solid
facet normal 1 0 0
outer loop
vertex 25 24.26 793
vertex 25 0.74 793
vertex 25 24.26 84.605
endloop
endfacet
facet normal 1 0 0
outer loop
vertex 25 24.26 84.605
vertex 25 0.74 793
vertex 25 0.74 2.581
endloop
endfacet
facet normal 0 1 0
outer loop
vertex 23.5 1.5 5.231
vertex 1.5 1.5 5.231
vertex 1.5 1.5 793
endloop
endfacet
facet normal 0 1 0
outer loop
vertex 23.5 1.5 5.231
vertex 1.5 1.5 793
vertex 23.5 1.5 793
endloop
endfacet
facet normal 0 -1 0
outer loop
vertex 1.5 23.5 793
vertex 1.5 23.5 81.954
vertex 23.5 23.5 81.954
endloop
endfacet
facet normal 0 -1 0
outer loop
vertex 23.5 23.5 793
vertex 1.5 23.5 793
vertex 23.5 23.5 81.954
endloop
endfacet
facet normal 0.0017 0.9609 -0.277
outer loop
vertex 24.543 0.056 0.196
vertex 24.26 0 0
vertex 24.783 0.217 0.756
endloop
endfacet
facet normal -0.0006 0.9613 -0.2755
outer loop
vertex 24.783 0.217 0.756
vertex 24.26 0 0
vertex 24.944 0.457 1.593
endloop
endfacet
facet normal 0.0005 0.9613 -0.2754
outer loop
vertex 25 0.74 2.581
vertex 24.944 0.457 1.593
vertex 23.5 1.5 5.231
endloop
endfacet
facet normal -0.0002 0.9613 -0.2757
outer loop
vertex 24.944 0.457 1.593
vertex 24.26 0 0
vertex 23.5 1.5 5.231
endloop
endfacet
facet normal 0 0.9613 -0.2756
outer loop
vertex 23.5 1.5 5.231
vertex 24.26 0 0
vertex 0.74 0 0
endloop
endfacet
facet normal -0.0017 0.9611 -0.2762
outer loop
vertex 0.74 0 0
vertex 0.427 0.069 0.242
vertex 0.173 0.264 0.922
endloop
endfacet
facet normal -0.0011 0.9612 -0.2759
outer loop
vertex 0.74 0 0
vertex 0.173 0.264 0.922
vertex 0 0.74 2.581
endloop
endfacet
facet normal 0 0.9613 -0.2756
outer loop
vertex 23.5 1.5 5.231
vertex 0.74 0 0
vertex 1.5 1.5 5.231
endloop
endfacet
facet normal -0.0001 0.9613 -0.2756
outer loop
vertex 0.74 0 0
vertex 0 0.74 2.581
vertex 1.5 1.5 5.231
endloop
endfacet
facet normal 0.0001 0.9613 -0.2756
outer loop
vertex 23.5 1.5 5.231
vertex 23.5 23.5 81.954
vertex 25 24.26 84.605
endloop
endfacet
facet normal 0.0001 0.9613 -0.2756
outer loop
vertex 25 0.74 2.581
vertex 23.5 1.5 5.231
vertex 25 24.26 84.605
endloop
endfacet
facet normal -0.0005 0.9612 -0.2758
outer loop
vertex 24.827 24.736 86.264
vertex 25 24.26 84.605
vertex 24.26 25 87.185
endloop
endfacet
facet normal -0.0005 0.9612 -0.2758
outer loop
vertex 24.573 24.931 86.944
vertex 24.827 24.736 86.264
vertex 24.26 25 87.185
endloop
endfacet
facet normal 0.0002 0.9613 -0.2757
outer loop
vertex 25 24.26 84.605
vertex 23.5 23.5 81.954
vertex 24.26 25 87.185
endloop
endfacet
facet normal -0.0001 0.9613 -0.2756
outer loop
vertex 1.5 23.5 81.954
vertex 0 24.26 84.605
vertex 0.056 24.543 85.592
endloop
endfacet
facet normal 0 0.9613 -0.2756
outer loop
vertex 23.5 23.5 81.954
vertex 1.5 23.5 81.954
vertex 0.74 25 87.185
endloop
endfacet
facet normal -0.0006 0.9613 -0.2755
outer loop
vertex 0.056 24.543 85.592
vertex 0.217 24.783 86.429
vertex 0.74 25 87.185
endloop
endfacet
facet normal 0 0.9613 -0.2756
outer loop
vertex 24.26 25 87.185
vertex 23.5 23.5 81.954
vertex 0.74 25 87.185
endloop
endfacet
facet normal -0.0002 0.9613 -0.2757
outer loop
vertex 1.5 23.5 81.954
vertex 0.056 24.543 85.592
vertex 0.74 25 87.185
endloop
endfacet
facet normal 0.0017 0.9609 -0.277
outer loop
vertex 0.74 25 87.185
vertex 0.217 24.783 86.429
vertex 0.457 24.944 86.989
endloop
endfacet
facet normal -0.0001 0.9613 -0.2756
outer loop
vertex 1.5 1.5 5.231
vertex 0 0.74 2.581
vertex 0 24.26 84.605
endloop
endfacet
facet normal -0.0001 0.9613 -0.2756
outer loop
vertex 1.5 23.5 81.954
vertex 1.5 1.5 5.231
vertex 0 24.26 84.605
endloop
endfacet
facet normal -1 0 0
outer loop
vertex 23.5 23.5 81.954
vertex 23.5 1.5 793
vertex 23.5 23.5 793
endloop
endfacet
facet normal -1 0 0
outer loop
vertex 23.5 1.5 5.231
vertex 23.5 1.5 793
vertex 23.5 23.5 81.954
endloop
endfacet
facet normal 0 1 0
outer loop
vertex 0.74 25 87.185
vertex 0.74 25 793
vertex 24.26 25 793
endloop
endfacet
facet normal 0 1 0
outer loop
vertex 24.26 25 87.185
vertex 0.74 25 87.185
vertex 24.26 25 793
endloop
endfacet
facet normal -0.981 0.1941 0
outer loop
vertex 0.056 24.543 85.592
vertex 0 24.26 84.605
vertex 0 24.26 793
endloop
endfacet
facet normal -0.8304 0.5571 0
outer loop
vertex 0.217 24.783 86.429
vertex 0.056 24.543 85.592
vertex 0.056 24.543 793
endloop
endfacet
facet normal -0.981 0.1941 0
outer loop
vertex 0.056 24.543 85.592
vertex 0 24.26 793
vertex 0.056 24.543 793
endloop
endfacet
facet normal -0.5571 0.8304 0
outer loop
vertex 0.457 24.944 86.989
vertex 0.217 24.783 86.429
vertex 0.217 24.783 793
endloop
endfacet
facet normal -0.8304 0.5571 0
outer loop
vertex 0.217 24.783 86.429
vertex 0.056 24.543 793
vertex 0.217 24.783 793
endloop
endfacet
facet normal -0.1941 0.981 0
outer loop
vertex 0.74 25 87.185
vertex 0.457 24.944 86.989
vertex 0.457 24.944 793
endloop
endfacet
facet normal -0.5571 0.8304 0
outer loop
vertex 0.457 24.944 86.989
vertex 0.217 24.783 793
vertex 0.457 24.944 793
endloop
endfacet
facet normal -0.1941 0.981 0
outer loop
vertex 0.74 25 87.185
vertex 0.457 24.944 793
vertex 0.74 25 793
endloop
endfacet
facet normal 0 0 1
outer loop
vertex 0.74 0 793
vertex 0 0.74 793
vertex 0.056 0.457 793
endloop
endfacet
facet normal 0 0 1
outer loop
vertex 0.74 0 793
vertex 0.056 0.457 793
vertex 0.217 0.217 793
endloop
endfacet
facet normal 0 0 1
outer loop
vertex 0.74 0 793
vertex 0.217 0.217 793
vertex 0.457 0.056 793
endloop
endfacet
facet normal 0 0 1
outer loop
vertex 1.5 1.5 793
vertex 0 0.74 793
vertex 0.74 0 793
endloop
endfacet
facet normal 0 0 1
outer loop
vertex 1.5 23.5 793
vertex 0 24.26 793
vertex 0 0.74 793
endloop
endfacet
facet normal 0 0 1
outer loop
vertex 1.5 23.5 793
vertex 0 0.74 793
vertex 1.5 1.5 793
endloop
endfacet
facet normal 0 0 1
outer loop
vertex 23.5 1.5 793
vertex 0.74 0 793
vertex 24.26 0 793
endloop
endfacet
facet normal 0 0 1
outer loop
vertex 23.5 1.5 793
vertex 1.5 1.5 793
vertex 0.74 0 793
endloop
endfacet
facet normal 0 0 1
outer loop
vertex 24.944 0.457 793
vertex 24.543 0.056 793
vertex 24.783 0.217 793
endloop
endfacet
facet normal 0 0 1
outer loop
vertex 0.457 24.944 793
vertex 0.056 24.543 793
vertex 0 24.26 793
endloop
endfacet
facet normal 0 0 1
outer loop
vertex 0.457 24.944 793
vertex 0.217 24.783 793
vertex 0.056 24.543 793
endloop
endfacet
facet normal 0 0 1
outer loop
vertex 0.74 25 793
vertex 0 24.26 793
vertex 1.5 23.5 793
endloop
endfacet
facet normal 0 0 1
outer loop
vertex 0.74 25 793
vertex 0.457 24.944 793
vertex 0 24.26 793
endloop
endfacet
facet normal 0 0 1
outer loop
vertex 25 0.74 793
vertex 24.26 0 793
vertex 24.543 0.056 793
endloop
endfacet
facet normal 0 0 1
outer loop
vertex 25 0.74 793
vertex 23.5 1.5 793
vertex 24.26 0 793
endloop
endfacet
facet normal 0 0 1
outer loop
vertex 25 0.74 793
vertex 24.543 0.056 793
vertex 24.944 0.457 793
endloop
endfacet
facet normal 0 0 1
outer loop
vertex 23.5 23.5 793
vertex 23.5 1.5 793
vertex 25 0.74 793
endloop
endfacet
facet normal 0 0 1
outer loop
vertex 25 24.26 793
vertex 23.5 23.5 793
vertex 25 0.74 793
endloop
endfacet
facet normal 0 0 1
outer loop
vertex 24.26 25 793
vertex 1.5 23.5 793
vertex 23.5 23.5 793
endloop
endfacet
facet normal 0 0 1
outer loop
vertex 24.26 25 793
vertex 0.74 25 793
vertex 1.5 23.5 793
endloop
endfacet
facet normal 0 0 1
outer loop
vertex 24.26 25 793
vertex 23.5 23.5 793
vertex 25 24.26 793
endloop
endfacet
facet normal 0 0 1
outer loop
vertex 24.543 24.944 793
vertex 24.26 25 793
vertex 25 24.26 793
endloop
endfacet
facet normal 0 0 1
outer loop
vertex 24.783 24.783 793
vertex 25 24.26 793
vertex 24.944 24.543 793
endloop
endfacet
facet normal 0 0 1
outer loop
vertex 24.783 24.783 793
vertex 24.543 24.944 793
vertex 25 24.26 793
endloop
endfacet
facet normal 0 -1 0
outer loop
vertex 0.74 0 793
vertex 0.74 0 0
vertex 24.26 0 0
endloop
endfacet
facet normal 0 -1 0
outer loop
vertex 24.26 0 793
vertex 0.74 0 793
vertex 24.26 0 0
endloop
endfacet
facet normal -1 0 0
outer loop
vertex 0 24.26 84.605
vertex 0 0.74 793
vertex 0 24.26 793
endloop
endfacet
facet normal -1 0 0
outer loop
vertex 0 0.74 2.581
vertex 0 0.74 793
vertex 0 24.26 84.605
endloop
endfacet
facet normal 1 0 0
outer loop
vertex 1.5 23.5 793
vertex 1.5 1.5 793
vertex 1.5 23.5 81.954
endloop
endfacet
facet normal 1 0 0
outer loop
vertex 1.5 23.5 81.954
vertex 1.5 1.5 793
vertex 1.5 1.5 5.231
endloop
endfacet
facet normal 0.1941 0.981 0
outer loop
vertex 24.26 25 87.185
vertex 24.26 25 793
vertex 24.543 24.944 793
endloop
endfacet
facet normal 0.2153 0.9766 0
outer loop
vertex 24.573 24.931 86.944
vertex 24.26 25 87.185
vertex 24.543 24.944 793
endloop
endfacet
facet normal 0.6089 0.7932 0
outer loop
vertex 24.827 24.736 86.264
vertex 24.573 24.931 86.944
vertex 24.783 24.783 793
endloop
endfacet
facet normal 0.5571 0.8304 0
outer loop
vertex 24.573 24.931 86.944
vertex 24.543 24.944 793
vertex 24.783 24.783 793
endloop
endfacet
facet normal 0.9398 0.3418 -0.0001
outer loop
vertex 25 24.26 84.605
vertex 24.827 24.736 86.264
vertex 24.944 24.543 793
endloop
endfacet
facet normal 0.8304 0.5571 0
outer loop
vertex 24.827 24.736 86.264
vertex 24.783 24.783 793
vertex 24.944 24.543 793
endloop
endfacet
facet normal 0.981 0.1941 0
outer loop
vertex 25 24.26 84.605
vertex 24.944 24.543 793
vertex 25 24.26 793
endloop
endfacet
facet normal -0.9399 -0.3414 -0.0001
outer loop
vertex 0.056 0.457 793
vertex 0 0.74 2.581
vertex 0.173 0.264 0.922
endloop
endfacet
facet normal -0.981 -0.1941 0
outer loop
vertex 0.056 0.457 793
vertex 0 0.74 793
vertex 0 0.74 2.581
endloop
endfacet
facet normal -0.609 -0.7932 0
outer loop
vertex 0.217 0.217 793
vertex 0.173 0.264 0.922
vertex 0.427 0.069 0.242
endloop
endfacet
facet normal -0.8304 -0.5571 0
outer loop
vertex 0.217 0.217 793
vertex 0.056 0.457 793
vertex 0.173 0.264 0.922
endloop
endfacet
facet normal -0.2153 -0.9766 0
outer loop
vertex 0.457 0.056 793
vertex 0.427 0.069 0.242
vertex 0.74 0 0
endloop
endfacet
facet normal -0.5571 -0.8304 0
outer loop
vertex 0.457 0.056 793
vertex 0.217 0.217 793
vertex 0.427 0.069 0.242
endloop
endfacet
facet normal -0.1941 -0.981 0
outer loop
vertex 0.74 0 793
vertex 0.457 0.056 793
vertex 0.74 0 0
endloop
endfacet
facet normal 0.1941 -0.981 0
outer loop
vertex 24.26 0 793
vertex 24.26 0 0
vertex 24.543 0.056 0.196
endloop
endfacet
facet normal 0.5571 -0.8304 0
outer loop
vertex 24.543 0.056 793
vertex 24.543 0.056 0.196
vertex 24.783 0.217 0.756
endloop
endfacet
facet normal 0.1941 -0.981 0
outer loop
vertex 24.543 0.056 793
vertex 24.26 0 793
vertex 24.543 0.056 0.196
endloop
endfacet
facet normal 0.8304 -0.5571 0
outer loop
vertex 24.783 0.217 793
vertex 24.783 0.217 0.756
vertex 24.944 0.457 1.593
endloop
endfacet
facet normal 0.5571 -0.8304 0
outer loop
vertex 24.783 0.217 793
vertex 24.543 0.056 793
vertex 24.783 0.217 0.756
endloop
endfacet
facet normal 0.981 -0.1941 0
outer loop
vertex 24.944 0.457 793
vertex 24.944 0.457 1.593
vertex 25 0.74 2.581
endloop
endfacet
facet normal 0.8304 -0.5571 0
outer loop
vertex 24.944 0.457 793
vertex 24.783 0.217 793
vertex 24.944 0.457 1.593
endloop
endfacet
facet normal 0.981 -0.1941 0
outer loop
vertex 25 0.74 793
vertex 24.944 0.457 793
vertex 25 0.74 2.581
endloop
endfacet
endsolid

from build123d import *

# Parameters (mm, degrees)
SKETCH_W     = 25
SKETCH_H     = 25
SKETCH_W_2   = 22
SKETCH_H_2   = 22
PAD_DEPTH    = 793
FILLET_R     = 0.74
POCKET_DEPTH = 25.001


with BuildPart() as part:
    # Sketch → Pad (new body)
    with BuildSketch(Plane.XY):
        with Locations((12.5, 12.5)):
            Rectangle(SKETCH_W, SKETCH_H)
        with Locations((12.5, 12.5)):
            Rectangle(SKETCH_W_2, SKETCH_H_2, mode=Mode.SUBTRACT)
    extrude(amount=PAD_DEPTH)

    # Fillet
    fillet_edges = [part.edges().sort_by_distance(p)[0] for p in [
        (25, 0, 396.5),
        (0, 0, 396.5),
        (25, 25, 396.5),
        (0, 25, 396.5),
    ]]
    fillet(fillet_edges, radius=FILLET_R)

    # Sketch001 (on Face6 of Fillet) → Pocket (cut, through all)
    with BuildSketch(Plane(origin=(0, 0, 0), x_dir=(0, -1, 0), z_dir=(-1, 0, 0))):
        Polygon((0, 0), (-33.812955, 117.919787), (-33.812955, -15.683764), align=None)
    extrude(amount=-POCKET_DEPTH, mode=Mode.SUBTRACT)


solid = part.part
